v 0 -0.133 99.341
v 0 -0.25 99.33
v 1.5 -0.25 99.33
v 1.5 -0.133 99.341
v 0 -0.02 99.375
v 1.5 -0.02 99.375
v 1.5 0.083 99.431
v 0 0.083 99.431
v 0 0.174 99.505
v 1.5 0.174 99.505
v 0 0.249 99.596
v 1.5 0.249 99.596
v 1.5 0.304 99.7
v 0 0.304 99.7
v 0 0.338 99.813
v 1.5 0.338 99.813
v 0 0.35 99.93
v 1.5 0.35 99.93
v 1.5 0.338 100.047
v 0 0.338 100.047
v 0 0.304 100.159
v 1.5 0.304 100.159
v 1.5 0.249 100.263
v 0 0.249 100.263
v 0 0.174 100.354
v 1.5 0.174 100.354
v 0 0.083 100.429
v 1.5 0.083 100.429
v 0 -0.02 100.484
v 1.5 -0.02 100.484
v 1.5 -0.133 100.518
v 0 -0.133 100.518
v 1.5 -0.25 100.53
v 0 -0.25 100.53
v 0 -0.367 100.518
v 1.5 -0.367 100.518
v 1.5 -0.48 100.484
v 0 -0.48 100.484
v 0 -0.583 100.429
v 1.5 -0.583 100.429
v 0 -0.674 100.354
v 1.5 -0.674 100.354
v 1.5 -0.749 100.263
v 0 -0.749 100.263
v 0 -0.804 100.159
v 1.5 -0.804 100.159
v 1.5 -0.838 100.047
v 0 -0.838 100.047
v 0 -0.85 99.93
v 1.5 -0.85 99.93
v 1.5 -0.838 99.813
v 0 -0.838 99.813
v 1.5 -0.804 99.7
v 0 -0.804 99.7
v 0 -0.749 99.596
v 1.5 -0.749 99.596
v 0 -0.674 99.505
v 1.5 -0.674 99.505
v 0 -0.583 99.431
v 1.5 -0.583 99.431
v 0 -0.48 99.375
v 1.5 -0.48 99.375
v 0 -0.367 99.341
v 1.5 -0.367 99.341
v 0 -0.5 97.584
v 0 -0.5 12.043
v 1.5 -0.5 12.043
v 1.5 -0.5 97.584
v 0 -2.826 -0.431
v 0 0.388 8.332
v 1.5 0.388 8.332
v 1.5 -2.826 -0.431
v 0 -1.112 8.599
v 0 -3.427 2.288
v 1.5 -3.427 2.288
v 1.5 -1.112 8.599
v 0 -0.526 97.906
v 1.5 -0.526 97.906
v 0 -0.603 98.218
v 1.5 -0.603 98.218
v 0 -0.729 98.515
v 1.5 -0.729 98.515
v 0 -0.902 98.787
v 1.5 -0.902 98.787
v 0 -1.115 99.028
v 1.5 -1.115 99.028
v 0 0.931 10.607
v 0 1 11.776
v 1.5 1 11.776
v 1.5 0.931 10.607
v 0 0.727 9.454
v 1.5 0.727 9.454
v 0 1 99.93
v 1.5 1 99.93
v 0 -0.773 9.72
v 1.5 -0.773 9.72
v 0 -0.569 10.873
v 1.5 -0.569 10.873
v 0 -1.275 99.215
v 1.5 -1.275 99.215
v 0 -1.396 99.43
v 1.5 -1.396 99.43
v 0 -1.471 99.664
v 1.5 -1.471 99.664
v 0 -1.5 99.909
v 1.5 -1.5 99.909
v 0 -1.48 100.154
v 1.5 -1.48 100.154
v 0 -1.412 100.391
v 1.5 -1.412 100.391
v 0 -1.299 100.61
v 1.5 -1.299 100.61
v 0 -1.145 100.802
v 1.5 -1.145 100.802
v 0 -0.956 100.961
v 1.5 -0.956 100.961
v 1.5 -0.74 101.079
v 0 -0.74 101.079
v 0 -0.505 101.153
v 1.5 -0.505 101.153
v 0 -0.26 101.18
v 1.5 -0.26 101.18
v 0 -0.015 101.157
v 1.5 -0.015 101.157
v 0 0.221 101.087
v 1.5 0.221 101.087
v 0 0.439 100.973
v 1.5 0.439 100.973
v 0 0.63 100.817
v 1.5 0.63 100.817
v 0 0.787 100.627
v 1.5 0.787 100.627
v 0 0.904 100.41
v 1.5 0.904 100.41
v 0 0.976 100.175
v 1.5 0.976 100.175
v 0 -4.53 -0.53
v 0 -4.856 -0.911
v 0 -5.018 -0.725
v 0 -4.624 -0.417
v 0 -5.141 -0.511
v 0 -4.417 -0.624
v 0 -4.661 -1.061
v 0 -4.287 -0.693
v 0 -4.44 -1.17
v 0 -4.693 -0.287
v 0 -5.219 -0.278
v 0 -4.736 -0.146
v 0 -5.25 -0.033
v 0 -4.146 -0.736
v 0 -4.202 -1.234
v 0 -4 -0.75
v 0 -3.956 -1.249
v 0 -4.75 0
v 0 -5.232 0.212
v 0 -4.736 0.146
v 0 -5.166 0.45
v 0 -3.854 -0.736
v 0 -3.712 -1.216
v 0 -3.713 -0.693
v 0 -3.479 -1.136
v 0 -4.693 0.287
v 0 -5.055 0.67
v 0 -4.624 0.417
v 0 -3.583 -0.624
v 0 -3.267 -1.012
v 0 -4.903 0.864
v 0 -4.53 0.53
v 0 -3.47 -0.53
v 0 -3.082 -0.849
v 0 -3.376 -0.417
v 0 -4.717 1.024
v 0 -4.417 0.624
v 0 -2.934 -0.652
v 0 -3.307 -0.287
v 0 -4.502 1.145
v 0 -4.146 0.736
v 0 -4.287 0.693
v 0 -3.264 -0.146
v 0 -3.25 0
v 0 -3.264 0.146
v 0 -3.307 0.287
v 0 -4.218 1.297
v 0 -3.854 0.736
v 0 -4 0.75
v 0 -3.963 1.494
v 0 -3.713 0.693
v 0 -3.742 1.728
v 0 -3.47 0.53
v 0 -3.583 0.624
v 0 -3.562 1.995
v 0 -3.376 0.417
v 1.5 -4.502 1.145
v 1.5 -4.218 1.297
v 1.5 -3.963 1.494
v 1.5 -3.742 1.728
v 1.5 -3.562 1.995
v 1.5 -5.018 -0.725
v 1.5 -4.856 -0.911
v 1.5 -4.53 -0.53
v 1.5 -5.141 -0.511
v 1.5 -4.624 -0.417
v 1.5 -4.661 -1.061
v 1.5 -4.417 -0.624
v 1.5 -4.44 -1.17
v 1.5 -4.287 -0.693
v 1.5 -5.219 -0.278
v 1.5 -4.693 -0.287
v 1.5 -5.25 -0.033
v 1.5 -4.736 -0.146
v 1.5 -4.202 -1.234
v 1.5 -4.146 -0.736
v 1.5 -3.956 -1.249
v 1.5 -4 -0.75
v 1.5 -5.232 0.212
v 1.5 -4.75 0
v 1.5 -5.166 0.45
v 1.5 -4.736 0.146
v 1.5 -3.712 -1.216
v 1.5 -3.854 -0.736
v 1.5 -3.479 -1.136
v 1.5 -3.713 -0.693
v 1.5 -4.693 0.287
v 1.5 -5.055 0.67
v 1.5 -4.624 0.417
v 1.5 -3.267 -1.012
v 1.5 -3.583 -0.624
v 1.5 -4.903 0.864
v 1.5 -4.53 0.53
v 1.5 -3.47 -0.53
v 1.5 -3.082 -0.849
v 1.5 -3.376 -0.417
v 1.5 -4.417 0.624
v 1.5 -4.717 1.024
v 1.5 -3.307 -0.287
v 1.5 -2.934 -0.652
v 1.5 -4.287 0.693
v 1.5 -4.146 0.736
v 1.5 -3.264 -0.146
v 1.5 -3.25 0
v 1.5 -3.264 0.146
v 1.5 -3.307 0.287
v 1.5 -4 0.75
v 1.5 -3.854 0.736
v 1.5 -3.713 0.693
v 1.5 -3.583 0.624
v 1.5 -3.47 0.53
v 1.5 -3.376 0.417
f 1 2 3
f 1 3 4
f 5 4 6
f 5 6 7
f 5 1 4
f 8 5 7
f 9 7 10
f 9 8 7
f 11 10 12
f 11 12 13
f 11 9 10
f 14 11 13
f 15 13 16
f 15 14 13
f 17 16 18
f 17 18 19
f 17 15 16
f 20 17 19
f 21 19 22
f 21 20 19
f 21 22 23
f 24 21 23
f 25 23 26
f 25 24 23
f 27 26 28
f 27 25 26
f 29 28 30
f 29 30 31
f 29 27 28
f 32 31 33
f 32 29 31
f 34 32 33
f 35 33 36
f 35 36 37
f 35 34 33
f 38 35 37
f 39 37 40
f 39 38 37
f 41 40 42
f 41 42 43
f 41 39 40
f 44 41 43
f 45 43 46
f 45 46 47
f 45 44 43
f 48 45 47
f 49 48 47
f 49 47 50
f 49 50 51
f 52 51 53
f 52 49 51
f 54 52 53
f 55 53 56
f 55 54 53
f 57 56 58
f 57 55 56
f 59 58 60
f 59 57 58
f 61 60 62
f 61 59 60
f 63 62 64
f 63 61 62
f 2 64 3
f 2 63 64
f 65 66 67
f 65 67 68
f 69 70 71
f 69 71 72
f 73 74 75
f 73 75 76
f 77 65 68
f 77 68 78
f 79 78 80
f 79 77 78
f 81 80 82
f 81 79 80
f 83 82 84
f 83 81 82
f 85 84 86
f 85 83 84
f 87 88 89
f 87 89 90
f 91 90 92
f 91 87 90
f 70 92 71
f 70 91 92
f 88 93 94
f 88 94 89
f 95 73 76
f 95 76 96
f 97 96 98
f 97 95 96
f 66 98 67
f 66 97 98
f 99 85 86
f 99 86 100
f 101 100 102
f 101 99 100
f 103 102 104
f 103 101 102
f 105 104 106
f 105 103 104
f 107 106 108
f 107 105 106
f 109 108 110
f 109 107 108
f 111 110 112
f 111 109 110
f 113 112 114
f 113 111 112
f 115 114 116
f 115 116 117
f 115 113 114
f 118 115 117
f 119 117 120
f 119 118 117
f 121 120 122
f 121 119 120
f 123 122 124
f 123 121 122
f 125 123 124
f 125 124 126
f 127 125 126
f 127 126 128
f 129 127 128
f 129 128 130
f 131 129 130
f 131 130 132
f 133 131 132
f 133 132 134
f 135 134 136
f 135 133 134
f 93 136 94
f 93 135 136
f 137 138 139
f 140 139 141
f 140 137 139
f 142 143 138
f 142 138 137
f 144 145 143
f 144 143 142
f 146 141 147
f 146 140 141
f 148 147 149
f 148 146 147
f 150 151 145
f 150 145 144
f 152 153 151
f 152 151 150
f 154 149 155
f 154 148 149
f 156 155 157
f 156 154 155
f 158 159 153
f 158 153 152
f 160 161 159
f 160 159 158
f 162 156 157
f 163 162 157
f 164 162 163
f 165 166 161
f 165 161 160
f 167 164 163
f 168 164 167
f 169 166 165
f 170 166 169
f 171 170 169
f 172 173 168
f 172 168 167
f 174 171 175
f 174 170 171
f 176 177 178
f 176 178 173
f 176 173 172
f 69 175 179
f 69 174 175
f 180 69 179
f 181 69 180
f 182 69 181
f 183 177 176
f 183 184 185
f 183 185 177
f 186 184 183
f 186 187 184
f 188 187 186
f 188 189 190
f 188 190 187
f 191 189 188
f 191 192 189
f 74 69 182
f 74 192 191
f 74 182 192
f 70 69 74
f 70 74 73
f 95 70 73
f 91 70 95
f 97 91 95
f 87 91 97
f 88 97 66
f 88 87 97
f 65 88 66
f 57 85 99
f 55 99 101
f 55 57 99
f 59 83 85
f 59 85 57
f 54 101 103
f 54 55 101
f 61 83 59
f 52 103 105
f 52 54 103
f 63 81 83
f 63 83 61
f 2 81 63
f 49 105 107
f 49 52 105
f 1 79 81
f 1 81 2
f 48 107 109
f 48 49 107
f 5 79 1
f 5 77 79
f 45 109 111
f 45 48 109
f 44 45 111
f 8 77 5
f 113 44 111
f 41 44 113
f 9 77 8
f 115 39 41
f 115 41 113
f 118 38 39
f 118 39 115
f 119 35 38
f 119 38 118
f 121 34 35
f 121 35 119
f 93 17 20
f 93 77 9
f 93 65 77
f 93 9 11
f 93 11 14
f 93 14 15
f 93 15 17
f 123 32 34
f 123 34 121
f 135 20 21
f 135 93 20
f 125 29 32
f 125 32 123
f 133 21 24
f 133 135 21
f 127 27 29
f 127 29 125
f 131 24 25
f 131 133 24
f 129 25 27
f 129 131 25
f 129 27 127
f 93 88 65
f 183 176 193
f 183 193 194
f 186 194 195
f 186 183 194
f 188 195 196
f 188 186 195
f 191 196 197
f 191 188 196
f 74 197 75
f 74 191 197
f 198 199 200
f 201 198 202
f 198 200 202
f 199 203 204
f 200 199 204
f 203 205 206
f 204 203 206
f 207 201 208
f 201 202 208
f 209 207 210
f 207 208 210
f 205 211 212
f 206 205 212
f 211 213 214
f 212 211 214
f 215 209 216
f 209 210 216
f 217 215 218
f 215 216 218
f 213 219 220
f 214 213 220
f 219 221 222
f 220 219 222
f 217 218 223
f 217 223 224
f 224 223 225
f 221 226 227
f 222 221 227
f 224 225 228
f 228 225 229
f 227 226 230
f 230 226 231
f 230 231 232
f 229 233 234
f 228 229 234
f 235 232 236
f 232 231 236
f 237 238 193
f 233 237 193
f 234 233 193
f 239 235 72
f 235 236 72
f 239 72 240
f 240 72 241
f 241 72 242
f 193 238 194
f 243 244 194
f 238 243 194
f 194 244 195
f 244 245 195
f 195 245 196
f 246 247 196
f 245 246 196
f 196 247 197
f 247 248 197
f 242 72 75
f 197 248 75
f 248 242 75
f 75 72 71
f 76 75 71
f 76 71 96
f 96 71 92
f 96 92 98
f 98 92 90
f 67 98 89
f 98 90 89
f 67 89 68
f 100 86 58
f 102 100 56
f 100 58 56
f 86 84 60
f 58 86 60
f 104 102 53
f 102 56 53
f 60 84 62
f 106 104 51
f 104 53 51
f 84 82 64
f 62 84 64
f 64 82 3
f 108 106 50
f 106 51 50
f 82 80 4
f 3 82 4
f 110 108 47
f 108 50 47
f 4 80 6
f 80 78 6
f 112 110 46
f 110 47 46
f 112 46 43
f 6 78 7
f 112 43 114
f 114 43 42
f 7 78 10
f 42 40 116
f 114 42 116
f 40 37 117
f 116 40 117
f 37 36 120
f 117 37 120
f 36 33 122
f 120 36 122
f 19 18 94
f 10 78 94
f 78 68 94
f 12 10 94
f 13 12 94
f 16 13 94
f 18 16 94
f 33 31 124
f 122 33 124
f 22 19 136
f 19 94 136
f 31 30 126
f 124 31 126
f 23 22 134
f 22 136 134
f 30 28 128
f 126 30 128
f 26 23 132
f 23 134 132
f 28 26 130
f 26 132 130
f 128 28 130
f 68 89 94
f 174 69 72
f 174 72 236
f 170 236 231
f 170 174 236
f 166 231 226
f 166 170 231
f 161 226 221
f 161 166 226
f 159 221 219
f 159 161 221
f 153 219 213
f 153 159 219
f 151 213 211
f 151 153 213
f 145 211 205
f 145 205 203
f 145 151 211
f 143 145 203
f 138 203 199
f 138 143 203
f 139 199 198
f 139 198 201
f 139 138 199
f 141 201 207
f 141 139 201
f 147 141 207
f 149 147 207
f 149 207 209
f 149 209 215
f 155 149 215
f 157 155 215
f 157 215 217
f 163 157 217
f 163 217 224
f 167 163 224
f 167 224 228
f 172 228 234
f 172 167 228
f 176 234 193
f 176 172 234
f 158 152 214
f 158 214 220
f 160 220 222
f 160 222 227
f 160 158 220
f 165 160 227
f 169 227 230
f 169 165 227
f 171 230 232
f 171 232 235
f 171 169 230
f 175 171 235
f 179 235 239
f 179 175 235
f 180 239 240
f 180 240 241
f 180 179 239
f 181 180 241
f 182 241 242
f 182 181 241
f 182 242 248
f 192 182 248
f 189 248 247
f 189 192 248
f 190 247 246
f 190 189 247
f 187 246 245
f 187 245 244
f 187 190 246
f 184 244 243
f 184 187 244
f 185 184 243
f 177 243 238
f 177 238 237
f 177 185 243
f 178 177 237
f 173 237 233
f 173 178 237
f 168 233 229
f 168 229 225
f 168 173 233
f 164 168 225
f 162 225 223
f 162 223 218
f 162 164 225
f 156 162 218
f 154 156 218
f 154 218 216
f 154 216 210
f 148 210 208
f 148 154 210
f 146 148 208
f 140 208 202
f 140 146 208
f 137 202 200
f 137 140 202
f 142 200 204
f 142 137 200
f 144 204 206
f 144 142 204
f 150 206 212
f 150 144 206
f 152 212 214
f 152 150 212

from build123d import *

# Parameters (mm, degrees)
SCHIZZO2_R                   = 0.6
SCHIZZO2_R_2                 = 0.75
ESTRUSIONE_ESTRUSIONE1_DEPTH = 1.5


with BuildPart() as part:
    # Schizzo2 → Estrusione-Estrusione1 (new body)
    with BuildSketch(Plane(origin=(0, 0, 0), x_dir=(0, 0, -1), z_dir=(1, 0, 0))):
        with BuildLine():
            Line((-8.332291626, 0.388194417), (0.430512151, -2.826475698))
            ThreePointArc((0.430512151, -2.826475698), (0.910624595, -4.856307682), (-1.144864856, -4.501781289))
            ThreePointArc((-1.144864856, -4.501781289), (-1.606556333, -3.847632001), (-2.287829183, -3.426992469))
            Line((-2.287829183, -3.426992469), (-8.598749951, -1.111805583))
            ThreePointArc((-8.598749951, -1.111805583), (-10.293839466, -0.654139343), (-12.04284716, -0.5))
            Line((-12.04284716, -0.5), (-97.584454883, -0.5))
            ThreePointArc((-97.584454883, -0.5), (-98.368919424, -0.660267578), (-99.027659733, -1.115384615))
            ThreePointArc((-99.027659733, -1.115384615), (-101.079495527, -0.740290338), (-99.929662763, 1))
            Line((-99.929662763, 1), (-11.776388835, 1))
            ThreePointArc((-11.776388835, 1), (-10.027381141, 0.845860657), (-8.332291626, 0.388194417))
        make_face()
        with Locations((-99.929662763, -0.25)):
            Circle(SCHIZZO2_R, mode=Mode.SUBTRACT)
        with Locations((0, -4)):
            Circle(SCHIZZO2_R_2, mode=Mode.SUBTRACT)
    extrude(amount=ESTRUSIONE_ESTRUSIONE1_DEPTH)


solid = part.part
